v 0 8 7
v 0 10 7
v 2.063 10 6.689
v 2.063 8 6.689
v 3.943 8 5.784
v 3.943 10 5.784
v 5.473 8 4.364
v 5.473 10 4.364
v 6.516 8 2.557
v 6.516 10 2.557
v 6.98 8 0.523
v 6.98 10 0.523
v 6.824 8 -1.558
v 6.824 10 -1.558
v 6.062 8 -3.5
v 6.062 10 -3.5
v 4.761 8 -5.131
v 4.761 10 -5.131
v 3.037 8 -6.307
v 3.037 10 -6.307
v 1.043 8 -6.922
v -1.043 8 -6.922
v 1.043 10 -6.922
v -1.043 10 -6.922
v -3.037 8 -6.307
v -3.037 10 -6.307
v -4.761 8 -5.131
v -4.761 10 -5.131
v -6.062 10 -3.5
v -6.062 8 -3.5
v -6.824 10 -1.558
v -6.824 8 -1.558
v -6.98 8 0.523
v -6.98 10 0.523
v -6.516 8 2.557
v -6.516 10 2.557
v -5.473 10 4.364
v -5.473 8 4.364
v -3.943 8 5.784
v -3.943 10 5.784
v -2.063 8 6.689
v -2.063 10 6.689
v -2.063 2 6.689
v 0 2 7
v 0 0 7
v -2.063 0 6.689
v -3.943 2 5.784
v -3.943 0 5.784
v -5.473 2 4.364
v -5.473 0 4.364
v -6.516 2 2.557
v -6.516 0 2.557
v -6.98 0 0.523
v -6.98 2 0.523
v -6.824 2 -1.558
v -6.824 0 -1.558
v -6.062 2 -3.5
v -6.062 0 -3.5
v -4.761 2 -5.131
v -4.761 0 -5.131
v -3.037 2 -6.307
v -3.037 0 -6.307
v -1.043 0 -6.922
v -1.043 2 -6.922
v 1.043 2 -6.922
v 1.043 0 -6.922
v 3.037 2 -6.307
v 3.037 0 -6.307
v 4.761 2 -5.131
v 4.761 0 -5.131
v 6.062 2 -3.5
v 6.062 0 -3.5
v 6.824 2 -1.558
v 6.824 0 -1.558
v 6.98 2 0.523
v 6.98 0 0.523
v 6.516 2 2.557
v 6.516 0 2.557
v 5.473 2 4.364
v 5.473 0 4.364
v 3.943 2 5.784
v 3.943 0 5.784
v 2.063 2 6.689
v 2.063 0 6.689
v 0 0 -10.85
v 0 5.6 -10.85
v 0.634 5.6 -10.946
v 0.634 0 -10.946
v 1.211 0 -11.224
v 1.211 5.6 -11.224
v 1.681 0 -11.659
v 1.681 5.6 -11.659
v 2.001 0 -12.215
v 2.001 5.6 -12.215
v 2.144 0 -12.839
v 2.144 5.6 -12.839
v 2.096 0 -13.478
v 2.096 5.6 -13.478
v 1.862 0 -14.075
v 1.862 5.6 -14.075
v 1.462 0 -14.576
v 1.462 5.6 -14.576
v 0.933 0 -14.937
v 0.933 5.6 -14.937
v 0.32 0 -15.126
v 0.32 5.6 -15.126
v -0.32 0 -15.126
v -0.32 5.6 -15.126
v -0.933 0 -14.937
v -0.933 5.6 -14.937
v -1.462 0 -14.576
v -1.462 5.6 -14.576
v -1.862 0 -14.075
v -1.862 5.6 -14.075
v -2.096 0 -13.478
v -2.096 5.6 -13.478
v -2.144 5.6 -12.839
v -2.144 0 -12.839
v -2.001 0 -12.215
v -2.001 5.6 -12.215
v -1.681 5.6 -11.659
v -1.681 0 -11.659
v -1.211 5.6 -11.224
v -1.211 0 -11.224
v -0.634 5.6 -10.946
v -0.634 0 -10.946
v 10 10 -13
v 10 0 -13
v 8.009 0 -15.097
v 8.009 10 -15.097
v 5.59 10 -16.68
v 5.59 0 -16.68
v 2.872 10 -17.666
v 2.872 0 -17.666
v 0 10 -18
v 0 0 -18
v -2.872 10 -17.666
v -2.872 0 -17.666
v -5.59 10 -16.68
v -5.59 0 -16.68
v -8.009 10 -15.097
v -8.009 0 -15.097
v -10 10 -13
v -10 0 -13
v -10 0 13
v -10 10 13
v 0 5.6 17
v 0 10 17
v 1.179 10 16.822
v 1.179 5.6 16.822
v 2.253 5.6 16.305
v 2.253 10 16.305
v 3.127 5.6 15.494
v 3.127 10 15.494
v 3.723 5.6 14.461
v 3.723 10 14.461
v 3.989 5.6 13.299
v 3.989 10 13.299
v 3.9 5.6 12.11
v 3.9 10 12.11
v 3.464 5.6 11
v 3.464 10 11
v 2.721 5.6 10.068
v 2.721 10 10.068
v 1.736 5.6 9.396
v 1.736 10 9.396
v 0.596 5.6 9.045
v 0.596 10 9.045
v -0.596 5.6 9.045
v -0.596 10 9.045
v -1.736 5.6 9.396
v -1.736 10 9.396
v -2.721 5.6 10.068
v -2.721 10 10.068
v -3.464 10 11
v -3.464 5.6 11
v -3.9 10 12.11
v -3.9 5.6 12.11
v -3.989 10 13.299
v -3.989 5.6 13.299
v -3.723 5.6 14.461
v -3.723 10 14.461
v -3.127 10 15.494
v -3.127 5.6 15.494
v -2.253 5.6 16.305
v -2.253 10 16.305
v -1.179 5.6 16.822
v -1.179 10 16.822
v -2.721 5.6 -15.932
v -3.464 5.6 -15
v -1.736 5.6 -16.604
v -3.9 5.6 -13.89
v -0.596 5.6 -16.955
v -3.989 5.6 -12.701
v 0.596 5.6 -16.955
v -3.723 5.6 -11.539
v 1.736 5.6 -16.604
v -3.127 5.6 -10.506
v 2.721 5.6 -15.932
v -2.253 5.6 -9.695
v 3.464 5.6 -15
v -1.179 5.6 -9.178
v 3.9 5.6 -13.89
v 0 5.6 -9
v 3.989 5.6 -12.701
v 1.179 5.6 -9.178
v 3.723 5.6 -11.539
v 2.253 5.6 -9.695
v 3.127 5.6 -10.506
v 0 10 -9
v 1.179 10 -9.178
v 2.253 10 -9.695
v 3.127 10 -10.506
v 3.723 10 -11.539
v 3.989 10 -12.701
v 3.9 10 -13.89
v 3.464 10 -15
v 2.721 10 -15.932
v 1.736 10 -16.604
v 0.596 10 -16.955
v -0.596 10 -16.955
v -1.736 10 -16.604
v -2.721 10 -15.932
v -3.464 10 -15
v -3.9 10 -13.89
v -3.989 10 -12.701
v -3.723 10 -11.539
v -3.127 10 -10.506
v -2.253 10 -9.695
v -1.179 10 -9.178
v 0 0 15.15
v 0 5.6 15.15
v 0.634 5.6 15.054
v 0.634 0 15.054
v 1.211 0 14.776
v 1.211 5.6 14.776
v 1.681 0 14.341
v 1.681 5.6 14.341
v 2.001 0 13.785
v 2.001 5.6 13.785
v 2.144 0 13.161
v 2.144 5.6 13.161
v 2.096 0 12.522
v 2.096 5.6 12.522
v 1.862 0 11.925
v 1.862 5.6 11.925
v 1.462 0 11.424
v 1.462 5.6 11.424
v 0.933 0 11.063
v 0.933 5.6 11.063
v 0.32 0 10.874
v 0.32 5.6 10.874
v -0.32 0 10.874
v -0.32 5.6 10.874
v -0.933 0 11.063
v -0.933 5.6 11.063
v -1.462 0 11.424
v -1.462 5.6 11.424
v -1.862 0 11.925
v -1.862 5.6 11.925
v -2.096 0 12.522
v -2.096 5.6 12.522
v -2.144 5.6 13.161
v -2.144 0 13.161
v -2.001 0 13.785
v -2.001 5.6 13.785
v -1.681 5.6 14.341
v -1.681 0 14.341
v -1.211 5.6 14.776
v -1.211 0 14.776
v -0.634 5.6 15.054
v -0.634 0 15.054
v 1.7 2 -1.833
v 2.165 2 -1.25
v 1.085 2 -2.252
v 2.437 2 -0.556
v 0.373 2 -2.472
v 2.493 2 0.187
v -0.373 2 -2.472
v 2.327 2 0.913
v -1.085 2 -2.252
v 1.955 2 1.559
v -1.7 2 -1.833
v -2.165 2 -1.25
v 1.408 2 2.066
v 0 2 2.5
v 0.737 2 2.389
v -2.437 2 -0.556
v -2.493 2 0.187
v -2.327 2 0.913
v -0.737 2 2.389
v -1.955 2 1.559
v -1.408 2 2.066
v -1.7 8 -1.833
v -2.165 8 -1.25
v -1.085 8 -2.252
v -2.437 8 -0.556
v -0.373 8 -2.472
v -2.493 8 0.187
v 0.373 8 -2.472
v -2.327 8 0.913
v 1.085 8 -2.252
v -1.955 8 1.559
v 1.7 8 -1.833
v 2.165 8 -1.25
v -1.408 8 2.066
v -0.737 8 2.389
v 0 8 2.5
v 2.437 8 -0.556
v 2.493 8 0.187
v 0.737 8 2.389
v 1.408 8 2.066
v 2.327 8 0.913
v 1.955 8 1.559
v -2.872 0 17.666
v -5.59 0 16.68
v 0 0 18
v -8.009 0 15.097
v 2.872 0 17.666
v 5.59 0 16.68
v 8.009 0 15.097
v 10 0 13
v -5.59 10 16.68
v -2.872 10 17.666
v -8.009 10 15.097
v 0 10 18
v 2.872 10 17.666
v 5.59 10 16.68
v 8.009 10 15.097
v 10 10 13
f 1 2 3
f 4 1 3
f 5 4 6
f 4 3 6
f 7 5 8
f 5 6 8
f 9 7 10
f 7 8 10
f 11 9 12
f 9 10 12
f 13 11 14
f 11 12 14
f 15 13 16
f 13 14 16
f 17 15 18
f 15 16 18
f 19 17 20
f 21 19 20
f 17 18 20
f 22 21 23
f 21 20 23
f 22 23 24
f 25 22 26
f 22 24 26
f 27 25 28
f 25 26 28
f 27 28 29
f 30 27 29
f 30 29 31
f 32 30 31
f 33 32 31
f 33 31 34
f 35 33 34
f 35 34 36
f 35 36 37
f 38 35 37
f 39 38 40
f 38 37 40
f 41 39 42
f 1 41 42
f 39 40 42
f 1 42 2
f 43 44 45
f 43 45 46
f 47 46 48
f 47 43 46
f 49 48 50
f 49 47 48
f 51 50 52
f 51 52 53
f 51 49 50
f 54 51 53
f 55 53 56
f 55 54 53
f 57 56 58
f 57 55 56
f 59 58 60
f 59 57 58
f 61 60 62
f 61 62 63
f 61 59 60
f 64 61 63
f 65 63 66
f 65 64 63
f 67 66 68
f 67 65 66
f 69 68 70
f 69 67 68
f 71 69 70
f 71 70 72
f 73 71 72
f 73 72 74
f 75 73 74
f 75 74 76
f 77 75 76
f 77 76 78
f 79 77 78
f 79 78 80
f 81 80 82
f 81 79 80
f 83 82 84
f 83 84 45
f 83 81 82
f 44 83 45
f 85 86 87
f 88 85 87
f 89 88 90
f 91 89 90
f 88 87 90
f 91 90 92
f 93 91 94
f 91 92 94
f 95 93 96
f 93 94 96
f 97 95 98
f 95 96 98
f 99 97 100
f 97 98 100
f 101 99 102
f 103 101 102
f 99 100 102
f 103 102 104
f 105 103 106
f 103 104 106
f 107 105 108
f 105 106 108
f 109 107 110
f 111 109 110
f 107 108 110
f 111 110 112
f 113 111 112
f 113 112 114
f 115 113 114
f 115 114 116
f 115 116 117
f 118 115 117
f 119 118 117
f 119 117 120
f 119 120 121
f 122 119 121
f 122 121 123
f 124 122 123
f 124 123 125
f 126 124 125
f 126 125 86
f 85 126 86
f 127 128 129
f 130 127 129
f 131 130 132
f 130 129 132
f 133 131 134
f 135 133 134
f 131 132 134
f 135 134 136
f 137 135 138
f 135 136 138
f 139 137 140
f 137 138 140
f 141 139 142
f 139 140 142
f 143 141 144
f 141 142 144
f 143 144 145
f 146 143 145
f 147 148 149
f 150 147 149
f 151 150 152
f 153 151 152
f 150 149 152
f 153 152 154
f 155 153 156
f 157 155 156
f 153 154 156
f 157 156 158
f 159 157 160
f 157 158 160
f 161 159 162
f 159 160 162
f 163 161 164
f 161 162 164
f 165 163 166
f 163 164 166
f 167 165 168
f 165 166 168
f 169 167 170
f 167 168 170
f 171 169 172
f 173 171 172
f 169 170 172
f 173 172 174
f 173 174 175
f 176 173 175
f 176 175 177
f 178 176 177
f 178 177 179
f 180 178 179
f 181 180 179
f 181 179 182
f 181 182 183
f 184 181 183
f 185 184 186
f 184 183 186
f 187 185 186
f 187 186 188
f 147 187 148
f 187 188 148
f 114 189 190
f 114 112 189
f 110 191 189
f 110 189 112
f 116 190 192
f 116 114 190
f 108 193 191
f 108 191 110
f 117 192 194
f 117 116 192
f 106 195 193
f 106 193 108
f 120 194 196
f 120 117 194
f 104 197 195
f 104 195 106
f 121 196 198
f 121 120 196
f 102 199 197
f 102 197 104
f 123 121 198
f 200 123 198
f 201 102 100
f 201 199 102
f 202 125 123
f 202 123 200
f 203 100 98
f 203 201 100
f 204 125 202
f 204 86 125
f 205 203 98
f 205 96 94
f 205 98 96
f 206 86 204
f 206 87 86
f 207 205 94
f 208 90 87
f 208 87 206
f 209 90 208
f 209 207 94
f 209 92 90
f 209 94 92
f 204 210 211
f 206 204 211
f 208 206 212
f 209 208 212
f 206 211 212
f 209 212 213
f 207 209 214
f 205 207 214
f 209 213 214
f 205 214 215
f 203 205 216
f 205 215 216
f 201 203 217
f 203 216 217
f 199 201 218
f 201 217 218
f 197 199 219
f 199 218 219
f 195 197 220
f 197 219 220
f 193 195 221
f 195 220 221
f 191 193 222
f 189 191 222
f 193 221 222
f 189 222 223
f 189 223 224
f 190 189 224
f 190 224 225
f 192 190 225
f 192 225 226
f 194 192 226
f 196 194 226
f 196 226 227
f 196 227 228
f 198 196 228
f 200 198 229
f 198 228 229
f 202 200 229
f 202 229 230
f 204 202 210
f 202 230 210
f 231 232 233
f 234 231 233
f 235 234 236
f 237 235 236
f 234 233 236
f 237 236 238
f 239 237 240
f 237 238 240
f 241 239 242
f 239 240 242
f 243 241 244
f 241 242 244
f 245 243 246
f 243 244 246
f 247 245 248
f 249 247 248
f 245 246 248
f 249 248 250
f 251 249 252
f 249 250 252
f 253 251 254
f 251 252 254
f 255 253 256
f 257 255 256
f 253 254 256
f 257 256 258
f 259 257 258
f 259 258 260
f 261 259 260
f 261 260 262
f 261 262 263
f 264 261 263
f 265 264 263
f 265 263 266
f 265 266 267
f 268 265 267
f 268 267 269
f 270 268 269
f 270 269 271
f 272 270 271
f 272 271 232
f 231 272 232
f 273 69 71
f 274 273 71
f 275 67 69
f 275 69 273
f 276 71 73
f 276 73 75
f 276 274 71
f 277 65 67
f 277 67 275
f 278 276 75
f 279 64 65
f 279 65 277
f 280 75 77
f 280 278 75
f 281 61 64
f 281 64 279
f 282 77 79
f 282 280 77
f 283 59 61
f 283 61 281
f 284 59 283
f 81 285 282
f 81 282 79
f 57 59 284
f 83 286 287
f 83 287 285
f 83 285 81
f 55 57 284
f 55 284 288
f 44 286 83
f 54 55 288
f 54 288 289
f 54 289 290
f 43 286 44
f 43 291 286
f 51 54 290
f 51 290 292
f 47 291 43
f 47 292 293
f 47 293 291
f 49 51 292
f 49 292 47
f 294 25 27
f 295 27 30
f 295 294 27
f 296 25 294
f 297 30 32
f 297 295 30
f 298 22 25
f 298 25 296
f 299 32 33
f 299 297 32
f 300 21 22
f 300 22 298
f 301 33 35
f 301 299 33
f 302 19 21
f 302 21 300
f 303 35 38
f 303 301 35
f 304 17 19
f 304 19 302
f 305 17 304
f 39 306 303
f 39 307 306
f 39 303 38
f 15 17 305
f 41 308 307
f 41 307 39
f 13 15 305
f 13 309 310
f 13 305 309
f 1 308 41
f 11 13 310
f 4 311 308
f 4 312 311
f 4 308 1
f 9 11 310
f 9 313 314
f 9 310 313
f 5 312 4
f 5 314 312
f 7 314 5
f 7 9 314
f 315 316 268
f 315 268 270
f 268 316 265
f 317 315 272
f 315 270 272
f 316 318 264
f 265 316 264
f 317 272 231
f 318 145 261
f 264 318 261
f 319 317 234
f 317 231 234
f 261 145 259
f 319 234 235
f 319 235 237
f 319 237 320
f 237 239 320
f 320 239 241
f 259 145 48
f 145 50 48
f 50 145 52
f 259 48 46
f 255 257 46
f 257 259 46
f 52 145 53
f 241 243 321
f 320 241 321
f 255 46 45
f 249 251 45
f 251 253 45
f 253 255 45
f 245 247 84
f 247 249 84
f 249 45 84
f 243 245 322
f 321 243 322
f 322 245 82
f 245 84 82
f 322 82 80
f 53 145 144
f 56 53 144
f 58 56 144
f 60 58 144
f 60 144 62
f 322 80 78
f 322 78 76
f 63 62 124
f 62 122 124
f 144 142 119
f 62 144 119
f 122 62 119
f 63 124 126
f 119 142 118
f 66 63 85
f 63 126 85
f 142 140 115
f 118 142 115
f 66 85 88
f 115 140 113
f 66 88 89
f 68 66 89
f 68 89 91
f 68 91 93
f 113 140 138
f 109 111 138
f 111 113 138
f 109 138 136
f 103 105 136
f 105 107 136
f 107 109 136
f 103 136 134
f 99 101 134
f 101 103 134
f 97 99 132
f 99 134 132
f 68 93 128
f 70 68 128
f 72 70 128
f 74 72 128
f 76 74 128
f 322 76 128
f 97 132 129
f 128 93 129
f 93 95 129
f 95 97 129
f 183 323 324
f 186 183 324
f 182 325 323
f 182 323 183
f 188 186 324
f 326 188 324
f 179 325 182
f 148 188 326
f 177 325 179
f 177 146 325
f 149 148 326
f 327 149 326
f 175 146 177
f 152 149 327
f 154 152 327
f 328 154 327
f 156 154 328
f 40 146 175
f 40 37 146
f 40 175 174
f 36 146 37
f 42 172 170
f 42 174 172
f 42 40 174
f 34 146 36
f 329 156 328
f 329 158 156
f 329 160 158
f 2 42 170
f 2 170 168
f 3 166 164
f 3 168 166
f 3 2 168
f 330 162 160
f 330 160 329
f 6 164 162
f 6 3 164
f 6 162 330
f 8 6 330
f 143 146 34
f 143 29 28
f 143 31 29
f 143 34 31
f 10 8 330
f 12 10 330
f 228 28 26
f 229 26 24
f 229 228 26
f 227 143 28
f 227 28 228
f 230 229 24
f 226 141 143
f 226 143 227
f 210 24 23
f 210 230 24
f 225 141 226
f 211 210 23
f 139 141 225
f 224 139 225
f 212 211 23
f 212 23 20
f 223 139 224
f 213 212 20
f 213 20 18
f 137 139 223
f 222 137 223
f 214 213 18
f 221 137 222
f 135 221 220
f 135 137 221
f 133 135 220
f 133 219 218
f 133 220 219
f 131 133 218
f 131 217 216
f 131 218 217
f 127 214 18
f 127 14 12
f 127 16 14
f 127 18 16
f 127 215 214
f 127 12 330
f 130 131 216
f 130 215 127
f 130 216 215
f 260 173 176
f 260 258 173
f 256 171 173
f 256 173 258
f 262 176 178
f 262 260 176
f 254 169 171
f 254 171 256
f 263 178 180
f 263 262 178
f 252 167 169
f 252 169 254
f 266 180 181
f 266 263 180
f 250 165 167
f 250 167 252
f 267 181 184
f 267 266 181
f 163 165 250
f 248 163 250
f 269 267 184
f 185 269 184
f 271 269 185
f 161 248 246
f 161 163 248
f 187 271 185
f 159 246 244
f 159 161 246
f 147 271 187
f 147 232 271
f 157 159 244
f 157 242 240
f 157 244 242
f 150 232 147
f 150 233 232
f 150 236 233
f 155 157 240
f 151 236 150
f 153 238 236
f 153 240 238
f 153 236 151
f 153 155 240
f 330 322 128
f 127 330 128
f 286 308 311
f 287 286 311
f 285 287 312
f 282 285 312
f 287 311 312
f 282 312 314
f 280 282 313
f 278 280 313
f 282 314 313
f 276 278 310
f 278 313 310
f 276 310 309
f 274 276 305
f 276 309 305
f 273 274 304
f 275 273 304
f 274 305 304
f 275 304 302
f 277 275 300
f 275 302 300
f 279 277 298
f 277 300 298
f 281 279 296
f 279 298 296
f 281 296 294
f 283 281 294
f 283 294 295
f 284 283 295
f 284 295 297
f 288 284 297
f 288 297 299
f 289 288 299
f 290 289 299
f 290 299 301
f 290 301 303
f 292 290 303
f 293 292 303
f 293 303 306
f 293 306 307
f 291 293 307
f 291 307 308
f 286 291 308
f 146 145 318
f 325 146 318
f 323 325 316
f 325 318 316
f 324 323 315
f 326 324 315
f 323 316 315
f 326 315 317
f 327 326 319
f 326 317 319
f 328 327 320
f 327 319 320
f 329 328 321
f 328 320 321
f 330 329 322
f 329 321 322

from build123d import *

# Parameters (mm, degrees)
BOSS_EXTRUDE1_DEPTH = 10
SKETCH2_R           = 4
CUT_EXTRUDE1_DEPTH  = 4.4
CUT_EXTRUDE2_REACH  = 23.339
SKETCH3_R           = 2.15
SKETCH4_R           = 7
CUT_EXTRUDE3_DEPTH  = 2
CUT_EXTRUDE4_REACH  = 24.091
SKETCH5_R           = 2.5
CUT_EXTRUDE5_START  = -2
SKETCH6_R           = 7
CUT_EXTRUDE5_DEPTH  = 2


with BuildPart() as part:
    # Sketch1 → Boss-Extrude1 (new body)
    with BuildSketch(Plane(origin=(0, 0, 0), x_dir=(1, 0, 0), z_dir=(0, 1, 0))):
        with BuildLine():
            Line((-10, 13), (-10, -13))
            ThreePointArc((-10, -13), (0, -18), (10, -13))
            Line((10, -13), (10, 13))
            ThreePointArc((10, 13), (0, 18), (-10, 13))
        make_face()
    extrude(amount=BOSS_EXTRUDE1_DEPTH)

    # Sketch2 → Cut-Extrude1 (cut)
    with BuildSketch(Plane(origin=(0, 10, 0), x_dir=(1, 0, 0), z_dir=(0, 1, 0))):
        with Locations(Location((0, 13, 0), (0, 0, 270))):
            Circle(SKETCH2_R)
        with Locations(Location((0, -13, 0), (0, 0, 270))):
            Circle(SKETCH2_R)
    extrude(amount=-CUT_EXTRUDE1_DEPTH, mode=Mode.SUBTRACT)

    # Sketch3 → Cut-Extrude2 (cut, up to next)
    with BuildSketch(Plane(origin=(0, 5.6, 0), x_dir=(1, 0, 0), z_dir=(0, 1, 0)), mode=Mode.PRIVATE) as cut_extrude2_sk1:
        with Locations(Location((0, 13, 0), (0, 0, 270))):
            Circle(SKETCH3_R)
    cut_extrude2_tool1 = extrude(cut_extrude2_sk1.sketch, amount=-CUT_EXTRUDE2_REACH, mode=Mode.PRIVATE) & part.part
    # Sketch3 → Cut-Extrude2 (cut, up to next)
    with BuildSketch(Plane(origin=(0, 5.6, 0), x_dir=(1, 0, 0), z_dir=(0, 1, 0)), mode=Mode.PRIVATE) as cut_extrude2_sk2:
        with Locations(Location((0, -13, 0), (0, 0, 270))):
            Circle(SKETCH3_R)
    cut_extrude2_tool2 = extrude(cut_extrude2_sk2.sketch, amount=-CUT_EXTRUDE2_REACH, mode=Mode.PRIVATE) & part.part
    add(cut_extrude2_tool1.solids().sort_by_distance((0, 5.6, -13))[0], mode=Mode.SUBTRACT)
    add(cut_extrude2_tool2.solids().sort_by_distance((0, 5.6, 13))[0], mode=Mode.SUBTRACT)

    # Sketch4 → Cut-Extrude3 (cut)
    with BuildSketch(Plane(origin=(0, 10, 0), x_dir=(1, 0, 0), z_dir=(0, 1, 0))):
        with Locations(Location((0, 0, 0), (0, 0, 270))):
            Circle(SKETCH4_R)
    extrude(amount=-CUT_EXTRUDE3_DEPTH, mode=Mode.SUBTRACT)

    # Sketch5 → Cut-Extrude4 (cut, up to next)
    with BuildSketch(Plane(origin=(0, 8, 0), x_dir=(1, 0, 0), z_dir=(0, 1, 0)), mode=Mode.PRIVATE) as cut_extrude4_sk1:
        with Locations(Location((0, 0, 0), (0, 0, 270))):
            Circle(SKETCH5_R)
    cut_extrude4_tool1 = extrude(cut_extrude4_sk1.sketch, amount=-CUT_EXTRUDE4_REACH, mode=Mode.PRIVATE) & part.part
    add(cut_extrude4_tool1.solids().sort_by_distance((0, 8, 0))[0], mode=Mode.SUBTRACT)

    # Sketch6 → Cut-Extrude5 (cut)
    with BuildSketch(Plane.XZ.offset(CUT_EXTRUDE5_START)):
        with Locations(Location((0, 0, 0), (0, 0, 90))):
            Circle(SKETCH6_R)
    extrude(amount=CUT_EXTRUDE5_DEPTH, mode=Mode.SUBTRACT)


solid = part.part
